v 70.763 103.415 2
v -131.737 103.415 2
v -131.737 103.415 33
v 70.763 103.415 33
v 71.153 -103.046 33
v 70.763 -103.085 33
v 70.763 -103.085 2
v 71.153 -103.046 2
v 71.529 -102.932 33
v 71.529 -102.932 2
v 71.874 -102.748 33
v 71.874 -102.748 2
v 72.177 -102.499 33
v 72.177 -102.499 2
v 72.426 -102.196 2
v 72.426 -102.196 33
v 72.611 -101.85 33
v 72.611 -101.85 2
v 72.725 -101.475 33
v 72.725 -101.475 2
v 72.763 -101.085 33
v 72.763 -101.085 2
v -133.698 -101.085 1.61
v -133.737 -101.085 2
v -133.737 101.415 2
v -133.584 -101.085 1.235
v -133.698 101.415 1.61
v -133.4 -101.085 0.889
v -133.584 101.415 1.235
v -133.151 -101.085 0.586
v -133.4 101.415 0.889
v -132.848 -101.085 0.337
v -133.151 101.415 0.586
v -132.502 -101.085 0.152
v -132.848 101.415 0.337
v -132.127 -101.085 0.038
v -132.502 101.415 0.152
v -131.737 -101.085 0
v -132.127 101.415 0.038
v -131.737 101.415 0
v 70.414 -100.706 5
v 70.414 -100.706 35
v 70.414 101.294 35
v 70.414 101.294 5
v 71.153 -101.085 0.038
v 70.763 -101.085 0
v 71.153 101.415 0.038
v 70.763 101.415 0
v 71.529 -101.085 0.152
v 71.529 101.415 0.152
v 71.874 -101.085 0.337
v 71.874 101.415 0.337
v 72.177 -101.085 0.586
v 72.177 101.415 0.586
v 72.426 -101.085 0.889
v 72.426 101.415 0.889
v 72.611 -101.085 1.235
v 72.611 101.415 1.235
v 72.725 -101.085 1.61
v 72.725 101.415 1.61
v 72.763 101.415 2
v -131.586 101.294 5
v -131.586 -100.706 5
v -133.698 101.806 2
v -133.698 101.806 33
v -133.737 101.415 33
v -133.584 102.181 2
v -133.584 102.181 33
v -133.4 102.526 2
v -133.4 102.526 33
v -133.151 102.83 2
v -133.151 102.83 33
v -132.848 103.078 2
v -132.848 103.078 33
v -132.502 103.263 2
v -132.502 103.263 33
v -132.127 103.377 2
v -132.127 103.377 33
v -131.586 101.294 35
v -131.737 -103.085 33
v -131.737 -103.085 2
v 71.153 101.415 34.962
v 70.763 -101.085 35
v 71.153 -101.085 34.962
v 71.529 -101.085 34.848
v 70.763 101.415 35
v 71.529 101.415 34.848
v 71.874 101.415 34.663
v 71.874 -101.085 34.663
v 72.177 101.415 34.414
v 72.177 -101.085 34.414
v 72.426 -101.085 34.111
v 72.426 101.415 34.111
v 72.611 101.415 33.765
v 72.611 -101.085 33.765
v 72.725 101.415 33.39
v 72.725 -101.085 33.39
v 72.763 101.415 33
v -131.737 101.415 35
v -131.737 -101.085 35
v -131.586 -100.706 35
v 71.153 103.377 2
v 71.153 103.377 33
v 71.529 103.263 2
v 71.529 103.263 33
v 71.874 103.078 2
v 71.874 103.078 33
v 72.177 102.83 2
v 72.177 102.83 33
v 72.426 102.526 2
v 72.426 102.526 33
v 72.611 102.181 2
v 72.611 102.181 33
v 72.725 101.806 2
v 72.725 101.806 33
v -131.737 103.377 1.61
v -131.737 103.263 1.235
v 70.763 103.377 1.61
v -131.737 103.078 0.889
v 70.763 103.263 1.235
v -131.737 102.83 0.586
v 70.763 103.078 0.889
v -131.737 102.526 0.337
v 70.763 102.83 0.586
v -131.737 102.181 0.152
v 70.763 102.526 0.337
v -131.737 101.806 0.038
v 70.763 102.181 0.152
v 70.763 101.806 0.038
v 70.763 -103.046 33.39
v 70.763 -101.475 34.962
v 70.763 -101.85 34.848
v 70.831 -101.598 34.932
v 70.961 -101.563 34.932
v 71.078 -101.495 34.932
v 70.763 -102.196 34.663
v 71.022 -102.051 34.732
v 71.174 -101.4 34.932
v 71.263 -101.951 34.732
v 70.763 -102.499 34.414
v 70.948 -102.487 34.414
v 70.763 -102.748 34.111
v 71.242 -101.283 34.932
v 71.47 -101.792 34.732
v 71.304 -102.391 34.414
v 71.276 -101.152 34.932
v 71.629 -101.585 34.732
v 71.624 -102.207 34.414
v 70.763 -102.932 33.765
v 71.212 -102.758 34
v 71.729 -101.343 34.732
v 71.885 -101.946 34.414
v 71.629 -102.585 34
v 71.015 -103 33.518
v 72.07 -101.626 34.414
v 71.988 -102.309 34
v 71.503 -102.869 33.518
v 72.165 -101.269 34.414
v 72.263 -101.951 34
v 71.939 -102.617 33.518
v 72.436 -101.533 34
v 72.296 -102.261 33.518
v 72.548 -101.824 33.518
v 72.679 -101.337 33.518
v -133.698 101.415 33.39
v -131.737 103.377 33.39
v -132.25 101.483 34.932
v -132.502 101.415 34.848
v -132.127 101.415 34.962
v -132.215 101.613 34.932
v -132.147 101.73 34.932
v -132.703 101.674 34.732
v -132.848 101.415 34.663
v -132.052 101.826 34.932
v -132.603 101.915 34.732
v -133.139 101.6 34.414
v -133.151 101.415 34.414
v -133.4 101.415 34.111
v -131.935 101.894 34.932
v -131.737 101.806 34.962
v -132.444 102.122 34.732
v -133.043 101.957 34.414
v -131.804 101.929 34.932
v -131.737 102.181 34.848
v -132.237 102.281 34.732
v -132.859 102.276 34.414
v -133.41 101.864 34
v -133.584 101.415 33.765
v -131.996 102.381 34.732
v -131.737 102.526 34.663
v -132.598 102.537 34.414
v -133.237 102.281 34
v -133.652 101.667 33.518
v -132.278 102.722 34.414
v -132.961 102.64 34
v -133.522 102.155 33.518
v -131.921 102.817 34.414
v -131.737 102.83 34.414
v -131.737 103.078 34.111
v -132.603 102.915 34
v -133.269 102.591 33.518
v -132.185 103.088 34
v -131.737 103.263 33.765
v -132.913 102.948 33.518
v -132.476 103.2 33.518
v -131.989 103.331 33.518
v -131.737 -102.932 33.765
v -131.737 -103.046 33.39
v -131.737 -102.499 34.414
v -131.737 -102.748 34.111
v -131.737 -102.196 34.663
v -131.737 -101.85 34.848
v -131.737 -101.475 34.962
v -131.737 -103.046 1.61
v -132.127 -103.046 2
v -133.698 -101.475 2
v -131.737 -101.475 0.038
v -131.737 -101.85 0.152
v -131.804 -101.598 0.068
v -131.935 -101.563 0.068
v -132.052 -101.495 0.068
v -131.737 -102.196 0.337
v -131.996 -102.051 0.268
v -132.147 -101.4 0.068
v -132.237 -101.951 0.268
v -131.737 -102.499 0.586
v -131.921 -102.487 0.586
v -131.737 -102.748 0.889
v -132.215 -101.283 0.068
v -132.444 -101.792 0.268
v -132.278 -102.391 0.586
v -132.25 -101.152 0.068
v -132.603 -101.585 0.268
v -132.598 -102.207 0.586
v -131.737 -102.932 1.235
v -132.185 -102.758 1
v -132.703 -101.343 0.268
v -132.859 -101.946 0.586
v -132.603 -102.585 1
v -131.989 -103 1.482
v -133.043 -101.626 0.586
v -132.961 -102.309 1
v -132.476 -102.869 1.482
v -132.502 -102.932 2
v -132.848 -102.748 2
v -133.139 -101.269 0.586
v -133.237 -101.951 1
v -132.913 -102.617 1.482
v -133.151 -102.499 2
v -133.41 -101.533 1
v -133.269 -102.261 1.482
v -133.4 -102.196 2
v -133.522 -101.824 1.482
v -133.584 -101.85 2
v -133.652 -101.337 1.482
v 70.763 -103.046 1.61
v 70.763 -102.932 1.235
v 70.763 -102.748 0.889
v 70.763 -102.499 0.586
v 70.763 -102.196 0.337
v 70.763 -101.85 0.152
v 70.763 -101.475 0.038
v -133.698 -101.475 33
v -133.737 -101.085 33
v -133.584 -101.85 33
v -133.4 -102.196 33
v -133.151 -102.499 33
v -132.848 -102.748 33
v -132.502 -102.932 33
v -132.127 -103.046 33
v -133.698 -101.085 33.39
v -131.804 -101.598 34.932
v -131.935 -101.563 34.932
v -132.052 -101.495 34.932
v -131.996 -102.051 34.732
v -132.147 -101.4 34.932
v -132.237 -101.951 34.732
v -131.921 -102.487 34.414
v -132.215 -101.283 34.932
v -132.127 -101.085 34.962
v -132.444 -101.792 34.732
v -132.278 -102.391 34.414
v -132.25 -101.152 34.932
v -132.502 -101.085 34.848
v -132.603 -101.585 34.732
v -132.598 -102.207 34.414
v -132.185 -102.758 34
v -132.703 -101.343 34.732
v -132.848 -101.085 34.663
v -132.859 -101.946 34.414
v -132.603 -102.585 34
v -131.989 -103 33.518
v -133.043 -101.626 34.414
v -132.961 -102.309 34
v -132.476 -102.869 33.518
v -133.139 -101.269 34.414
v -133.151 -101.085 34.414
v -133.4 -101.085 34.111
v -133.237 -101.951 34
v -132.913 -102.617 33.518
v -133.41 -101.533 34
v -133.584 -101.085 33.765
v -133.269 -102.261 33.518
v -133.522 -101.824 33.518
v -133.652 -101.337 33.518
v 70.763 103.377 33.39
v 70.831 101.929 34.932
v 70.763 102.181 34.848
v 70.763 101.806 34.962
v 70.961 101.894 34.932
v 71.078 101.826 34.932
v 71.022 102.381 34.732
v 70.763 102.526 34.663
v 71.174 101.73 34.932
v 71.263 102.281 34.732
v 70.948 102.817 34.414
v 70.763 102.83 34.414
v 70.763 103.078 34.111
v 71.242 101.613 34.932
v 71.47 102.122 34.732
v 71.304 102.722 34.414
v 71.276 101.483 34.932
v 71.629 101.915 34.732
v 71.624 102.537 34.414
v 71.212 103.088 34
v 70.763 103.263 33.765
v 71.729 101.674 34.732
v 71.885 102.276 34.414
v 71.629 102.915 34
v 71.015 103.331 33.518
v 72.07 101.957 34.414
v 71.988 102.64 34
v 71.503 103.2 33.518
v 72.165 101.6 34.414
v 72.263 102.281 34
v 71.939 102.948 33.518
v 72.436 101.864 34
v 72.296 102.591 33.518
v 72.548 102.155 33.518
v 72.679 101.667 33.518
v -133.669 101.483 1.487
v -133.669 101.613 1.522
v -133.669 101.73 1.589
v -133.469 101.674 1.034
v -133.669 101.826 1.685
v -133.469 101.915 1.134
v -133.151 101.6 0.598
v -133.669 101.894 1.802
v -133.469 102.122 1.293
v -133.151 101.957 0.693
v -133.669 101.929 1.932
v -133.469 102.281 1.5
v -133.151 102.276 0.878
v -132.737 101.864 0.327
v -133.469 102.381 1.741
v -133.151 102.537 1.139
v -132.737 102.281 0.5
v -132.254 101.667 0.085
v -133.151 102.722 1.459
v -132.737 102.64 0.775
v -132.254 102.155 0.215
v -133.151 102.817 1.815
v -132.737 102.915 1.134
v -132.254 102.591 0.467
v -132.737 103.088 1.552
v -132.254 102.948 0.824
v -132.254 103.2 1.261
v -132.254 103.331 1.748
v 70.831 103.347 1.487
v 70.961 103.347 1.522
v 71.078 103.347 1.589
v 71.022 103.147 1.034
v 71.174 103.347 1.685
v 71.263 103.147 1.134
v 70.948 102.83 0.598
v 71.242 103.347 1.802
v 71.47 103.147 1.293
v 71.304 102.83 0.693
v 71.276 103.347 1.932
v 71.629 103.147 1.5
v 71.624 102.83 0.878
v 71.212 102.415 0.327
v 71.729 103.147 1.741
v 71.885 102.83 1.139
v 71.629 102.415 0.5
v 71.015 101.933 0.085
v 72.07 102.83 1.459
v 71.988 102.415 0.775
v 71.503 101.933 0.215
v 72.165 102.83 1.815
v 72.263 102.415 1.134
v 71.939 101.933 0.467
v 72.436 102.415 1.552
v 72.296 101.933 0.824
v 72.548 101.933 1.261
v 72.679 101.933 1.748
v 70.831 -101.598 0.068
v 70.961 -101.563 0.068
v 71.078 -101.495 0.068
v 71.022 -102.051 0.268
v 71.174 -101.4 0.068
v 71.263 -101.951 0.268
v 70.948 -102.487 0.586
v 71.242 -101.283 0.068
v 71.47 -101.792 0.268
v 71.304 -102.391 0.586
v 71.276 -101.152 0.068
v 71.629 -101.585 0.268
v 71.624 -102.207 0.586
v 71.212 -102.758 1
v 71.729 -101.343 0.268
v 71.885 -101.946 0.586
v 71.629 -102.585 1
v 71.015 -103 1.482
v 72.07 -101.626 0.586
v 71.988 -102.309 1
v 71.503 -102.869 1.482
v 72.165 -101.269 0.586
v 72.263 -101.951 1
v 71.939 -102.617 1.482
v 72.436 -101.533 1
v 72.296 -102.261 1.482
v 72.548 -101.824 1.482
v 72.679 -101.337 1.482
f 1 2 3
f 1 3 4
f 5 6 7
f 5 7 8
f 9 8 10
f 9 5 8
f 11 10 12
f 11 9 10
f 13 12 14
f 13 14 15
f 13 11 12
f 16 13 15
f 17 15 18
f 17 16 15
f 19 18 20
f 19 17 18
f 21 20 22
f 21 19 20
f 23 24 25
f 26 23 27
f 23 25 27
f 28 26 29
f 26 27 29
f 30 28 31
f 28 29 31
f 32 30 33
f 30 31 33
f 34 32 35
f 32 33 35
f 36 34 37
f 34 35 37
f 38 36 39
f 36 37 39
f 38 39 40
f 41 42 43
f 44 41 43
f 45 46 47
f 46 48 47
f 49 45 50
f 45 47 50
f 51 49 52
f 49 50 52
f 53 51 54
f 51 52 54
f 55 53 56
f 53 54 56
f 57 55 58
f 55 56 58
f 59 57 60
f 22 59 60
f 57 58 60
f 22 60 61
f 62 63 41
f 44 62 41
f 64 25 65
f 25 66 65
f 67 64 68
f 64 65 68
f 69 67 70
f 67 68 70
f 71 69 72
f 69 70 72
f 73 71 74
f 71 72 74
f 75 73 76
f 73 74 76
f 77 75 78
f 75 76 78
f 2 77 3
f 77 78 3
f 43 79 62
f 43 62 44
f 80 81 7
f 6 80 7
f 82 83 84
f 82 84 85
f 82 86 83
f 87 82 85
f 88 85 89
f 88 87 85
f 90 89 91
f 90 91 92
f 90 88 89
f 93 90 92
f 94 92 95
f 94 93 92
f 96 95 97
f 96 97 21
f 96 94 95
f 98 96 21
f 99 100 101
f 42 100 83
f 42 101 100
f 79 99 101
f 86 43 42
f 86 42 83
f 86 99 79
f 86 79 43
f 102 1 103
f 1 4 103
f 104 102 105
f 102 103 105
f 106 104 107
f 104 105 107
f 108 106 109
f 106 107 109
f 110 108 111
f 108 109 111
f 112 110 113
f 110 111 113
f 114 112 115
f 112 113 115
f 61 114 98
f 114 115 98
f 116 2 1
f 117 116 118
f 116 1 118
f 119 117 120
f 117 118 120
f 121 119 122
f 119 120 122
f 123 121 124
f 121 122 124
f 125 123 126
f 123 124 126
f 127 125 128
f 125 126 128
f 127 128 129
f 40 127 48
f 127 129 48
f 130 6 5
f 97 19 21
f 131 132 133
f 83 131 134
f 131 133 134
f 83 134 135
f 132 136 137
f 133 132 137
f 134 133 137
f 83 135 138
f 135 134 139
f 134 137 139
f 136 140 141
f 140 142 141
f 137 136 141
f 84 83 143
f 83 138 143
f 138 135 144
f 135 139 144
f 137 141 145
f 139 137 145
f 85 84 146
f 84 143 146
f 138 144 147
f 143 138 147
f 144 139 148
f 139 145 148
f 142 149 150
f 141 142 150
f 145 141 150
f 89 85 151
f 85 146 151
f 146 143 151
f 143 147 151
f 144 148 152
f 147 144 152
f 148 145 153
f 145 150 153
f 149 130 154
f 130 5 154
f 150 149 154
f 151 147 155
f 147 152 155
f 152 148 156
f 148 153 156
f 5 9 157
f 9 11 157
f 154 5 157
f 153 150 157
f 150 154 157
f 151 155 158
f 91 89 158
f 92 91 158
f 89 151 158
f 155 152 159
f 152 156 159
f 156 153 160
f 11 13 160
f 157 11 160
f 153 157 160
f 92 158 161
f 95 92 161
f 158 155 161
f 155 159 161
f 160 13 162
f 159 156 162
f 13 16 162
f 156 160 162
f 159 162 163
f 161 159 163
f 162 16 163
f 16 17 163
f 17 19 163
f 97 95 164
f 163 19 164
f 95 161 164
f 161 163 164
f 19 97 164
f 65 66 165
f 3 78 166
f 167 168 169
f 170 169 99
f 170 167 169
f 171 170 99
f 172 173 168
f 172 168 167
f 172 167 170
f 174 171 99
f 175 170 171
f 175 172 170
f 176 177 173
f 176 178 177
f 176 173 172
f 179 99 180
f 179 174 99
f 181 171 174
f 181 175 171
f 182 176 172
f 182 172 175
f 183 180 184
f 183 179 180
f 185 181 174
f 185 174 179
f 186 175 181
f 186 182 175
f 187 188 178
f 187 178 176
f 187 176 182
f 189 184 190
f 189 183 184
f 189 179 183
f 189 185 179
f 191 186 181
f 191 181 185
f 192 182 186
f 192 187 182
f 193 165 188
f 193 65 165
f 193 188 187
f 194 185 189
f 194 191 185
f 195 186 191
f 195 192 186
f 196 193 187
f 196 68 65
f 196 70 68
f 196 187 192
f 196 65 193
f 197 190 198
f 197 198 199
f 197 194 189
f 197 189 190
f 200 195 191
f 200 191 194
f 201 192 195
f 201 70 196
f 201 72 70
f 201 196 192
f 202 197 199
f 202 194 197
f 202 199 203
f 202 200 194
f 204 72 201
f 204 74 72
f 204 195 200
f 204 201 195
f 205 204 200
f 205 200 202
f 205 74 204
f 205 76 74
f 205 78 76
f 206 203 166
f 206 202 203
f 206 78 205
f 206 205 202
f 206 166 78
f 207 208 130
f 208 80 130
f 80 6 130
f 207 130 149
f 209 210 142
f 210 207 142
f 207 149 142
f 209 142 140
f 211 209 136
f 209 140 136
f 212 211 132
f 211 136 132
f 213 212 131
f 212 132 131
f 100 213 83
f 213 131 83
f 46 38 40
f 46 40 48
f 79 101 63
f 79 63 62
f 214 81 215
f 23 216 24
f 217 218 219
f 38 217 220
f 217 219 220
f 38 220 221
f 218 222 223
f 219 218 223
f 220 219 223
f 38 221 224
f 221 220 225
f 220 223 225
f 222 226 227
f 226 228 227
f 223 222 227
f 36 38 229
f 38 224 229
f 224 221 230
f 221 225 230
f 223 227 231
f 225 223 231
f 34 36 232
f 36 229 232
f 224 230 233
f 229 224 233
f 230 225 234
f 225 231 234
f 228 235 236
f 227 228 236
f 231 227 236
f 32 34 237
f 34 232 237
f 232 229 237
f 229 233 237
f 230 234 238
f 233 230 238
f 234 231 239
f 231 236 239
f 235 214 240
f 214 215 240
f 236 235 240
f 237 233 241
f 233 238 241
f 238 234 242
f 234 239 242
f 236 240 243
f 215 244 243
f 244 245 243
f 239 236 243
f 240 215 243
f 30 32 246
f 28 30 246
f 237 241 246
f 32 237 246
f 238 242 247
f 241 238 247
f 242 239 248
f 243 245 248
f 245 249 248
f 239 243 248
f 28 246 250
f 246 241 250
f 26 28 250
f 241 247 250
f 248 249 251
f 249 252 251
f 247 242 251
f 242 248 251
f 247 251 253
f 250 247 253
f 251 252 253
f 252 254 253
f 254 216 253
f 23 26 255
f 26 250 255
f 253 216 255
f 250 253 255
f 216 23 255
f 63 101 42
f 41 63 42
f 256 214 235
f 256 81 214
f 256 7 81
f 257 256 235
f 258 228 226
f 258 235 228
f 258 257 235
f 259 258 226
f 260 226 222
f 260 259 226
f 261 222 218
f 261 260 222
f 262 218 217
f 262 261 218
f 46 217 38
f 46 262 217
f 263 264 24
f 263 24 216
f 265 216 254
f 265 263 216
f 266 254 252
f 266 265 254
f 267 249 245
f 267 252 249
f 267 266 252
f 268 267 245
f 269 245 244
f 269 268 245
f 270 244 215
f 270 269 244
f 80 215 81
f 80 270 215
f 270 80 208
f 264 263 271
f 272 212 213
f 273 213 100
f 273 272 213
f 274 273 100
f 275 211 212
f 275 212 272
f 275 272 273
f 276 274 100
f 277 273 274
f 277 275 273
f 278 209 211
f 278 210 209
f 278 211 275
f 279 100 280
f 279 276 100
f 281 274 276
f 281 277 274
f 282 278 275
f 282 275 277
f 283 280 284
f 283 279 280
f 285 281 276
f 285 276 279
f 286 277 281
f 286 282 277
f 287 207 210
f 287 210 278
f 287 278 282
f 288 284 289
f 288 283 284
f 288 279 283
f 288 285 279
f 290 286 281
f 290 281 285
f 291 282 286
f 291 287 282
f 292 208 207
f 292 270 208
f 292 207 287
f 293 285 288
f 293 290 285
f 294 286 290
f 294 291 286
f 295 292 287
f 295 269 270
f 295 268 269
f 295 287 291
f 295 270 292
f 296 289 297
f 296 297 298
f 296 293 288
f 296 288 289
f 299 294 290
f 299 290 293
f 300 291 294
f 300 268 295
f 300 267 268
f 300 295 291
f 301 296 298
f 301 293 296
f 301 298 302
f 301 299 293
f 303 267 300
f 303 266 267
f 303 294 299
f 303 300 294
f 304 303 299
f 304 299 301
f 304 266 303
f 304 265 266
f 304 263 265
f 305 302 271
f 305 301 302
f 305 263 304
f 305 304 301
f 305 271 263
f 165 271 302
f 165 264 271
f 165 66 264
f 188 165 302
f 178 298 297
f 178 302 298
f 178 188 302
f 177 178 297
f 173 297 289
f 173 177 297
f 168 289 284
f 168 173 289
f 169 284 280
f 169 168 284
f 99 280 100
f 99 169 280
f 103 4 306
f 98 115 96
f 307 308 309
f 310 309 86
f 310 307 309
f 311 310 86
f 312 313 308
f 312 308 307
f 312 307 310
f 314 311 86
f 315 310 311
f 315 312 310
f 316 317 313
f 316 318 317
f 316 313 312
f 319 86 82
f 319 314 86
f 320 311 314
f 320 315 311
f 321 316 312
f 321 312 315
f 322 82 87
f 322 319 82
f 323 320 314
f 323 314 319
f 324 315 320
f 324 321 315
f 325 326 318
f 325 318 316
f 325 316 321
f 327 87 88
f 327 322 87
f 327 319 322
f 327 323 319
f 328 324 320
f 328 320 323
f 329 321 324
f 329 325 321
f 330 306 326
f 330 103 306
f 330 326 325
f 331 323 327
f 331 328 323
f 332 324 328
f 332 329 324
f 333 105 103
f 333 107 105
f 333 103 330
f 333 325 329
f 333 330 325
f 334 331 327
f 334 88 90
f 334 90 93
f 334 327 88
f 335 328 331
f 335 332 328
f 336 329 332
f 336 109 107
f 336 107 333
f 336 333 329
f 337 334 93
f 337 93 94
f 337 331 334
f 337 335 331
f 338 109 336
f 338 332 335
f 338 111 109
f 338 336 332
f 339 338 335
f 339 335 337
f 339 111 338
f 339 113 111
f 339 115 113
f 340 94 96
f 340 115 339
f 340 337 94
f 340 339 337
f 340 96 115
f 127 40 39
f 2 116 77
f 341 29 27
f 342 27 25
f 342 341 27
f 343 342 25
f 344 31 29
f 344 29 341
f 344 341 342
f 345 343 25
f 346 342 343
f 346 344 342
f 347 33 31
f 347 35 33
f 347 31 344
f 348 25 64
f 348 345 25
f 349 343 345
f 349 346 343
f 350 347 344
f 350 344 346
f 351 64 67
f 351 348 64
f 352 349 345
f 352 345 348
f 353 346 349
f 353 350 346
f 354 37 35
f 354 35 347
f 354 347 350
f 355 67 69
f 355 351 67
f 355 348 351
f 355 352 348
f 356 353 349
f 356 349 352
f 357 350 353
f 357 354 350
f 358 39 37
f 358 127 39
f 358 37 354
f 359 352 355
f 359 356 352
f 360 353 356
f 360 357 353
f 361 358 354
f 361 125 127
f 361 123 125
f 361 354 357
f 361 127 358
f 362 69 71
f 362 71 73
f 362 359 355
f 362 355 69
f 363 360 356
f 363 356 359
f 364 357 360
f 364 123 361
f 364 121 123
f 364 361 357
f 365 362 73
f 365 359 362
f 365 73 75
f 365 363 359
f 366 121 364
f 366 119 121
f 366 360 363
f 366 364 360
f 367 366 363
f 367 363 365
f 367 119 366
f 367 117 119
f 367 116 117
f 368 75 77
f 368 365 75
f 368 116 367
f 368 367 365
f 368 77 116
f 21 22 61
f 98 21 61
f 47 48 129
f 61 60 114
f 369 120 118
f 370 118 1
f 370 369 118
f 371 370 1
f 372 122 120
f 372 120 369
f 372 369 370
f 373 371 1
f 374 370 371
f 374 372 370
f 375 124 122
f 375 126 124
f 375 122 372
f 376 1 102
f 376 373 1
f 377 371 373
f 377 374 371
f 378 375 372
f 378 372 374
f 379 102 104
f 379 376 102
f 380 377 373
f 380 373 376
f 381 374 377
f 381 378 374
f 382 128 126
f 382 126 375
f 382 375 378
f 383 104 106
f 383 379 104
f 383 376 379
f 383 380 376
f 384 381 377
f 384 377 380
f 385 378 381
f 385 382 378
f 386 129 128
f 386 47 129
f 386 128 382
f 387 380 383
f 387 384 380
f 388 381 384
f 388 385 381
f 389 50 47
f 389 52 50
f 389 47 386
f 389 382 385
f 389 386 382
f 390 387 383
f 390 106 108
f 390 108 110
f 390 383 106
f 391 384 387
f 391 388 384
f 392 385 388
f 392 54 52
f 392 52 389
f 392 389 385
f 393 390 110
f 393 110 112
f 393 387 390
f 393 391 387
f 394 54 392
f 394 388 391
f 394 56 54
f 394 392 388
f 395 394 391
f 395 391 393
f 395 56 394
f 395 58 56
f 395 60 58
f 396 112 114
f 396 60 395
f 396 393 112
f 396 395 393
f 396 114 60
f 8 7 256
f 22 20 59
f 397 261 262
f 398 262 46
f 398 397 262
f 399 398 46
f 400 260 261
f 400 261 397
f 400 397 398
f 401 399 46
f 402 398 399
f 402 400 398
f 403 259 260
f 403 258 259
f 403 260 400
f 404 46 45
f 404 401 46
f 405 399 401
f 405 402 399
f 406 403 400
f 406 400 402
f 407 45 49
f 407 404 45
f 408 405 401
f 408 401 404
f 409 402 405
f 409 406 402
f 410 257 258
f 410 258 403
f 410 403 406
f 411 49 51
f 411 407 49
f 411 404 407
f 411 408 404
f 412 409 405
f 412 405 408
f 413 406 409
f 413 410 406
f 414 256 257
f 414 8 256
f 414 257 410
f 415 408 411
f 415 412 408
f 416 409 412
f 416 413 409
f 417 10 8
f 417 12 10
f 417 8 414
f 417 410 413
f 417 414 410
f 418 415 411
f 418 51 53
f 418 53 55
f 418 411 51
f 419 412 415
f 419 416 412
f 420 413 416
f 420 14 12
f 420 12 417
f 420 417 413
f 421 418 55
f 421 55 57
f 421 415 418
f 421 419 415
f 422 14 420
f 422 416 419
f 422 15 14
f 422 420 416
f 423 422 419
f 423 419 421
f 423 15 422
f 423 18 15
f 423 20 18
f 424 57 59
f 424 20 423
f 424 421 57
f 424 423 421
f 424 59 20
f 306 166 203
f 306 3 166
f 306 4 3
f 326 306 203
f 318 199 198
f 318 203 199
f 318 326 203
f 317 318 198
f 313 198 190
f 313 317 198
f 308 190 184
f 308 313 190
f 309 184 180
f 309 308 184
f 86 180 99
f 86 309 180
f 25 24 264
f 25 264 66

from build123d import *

# Parameters (mm, degrees)
F0_W     = 206.5
F0_H     = 206.5
F1_DEPTH = 35
F2_W     = 202
F2_H     = 202
F3_DEPTH = 30
F4_R     = 2


with BuildPart() as f1:
    # F0 (on Top) → F1 (new body)
    with BuildSketch(Plane.XY):
        with Locations((-30.486728, 0.165322)):
            Rectangle(F0_W, F0_H)
    extrude(amount=F1_DEPTH)

    # F2 (on face) → F3 (cut)
    with BuildSketch(Plane.XY.offset(35)):
        with Locations((-30.586105, 0.294354)):
            Rectangle(F2_W, F2_H)
    extrude(amount=-F3_DEPTH, mode=Mode.SUBTRACT)

    # F4
    f4_edges = [f1.edges().sort_by_distance(p)[0] for p in [
        (-133.736728, -103.084678, 17.5),
        (72.763272, -103.084678, 17.5),
        (-30.486728, -103.084678, 0),
        (-30.486728, -103.084678, 35),
        (72.763272, 0.165322, 0),
        (-30.486728, 103.415322, 0),
        (-133.736728, 0.165322, 0),
        (-133.736728, 103.415322, 17.5),
        (-133.736728, 0.165322, 35),
        (72.763272, 103.415322, 17.5),
        (-30.486728, 103.415322, 35),
        (72.763272, 0.165322, 35),
    ]]
    fillet(f4_edges, radius=F4_R)


solid = f1.part
